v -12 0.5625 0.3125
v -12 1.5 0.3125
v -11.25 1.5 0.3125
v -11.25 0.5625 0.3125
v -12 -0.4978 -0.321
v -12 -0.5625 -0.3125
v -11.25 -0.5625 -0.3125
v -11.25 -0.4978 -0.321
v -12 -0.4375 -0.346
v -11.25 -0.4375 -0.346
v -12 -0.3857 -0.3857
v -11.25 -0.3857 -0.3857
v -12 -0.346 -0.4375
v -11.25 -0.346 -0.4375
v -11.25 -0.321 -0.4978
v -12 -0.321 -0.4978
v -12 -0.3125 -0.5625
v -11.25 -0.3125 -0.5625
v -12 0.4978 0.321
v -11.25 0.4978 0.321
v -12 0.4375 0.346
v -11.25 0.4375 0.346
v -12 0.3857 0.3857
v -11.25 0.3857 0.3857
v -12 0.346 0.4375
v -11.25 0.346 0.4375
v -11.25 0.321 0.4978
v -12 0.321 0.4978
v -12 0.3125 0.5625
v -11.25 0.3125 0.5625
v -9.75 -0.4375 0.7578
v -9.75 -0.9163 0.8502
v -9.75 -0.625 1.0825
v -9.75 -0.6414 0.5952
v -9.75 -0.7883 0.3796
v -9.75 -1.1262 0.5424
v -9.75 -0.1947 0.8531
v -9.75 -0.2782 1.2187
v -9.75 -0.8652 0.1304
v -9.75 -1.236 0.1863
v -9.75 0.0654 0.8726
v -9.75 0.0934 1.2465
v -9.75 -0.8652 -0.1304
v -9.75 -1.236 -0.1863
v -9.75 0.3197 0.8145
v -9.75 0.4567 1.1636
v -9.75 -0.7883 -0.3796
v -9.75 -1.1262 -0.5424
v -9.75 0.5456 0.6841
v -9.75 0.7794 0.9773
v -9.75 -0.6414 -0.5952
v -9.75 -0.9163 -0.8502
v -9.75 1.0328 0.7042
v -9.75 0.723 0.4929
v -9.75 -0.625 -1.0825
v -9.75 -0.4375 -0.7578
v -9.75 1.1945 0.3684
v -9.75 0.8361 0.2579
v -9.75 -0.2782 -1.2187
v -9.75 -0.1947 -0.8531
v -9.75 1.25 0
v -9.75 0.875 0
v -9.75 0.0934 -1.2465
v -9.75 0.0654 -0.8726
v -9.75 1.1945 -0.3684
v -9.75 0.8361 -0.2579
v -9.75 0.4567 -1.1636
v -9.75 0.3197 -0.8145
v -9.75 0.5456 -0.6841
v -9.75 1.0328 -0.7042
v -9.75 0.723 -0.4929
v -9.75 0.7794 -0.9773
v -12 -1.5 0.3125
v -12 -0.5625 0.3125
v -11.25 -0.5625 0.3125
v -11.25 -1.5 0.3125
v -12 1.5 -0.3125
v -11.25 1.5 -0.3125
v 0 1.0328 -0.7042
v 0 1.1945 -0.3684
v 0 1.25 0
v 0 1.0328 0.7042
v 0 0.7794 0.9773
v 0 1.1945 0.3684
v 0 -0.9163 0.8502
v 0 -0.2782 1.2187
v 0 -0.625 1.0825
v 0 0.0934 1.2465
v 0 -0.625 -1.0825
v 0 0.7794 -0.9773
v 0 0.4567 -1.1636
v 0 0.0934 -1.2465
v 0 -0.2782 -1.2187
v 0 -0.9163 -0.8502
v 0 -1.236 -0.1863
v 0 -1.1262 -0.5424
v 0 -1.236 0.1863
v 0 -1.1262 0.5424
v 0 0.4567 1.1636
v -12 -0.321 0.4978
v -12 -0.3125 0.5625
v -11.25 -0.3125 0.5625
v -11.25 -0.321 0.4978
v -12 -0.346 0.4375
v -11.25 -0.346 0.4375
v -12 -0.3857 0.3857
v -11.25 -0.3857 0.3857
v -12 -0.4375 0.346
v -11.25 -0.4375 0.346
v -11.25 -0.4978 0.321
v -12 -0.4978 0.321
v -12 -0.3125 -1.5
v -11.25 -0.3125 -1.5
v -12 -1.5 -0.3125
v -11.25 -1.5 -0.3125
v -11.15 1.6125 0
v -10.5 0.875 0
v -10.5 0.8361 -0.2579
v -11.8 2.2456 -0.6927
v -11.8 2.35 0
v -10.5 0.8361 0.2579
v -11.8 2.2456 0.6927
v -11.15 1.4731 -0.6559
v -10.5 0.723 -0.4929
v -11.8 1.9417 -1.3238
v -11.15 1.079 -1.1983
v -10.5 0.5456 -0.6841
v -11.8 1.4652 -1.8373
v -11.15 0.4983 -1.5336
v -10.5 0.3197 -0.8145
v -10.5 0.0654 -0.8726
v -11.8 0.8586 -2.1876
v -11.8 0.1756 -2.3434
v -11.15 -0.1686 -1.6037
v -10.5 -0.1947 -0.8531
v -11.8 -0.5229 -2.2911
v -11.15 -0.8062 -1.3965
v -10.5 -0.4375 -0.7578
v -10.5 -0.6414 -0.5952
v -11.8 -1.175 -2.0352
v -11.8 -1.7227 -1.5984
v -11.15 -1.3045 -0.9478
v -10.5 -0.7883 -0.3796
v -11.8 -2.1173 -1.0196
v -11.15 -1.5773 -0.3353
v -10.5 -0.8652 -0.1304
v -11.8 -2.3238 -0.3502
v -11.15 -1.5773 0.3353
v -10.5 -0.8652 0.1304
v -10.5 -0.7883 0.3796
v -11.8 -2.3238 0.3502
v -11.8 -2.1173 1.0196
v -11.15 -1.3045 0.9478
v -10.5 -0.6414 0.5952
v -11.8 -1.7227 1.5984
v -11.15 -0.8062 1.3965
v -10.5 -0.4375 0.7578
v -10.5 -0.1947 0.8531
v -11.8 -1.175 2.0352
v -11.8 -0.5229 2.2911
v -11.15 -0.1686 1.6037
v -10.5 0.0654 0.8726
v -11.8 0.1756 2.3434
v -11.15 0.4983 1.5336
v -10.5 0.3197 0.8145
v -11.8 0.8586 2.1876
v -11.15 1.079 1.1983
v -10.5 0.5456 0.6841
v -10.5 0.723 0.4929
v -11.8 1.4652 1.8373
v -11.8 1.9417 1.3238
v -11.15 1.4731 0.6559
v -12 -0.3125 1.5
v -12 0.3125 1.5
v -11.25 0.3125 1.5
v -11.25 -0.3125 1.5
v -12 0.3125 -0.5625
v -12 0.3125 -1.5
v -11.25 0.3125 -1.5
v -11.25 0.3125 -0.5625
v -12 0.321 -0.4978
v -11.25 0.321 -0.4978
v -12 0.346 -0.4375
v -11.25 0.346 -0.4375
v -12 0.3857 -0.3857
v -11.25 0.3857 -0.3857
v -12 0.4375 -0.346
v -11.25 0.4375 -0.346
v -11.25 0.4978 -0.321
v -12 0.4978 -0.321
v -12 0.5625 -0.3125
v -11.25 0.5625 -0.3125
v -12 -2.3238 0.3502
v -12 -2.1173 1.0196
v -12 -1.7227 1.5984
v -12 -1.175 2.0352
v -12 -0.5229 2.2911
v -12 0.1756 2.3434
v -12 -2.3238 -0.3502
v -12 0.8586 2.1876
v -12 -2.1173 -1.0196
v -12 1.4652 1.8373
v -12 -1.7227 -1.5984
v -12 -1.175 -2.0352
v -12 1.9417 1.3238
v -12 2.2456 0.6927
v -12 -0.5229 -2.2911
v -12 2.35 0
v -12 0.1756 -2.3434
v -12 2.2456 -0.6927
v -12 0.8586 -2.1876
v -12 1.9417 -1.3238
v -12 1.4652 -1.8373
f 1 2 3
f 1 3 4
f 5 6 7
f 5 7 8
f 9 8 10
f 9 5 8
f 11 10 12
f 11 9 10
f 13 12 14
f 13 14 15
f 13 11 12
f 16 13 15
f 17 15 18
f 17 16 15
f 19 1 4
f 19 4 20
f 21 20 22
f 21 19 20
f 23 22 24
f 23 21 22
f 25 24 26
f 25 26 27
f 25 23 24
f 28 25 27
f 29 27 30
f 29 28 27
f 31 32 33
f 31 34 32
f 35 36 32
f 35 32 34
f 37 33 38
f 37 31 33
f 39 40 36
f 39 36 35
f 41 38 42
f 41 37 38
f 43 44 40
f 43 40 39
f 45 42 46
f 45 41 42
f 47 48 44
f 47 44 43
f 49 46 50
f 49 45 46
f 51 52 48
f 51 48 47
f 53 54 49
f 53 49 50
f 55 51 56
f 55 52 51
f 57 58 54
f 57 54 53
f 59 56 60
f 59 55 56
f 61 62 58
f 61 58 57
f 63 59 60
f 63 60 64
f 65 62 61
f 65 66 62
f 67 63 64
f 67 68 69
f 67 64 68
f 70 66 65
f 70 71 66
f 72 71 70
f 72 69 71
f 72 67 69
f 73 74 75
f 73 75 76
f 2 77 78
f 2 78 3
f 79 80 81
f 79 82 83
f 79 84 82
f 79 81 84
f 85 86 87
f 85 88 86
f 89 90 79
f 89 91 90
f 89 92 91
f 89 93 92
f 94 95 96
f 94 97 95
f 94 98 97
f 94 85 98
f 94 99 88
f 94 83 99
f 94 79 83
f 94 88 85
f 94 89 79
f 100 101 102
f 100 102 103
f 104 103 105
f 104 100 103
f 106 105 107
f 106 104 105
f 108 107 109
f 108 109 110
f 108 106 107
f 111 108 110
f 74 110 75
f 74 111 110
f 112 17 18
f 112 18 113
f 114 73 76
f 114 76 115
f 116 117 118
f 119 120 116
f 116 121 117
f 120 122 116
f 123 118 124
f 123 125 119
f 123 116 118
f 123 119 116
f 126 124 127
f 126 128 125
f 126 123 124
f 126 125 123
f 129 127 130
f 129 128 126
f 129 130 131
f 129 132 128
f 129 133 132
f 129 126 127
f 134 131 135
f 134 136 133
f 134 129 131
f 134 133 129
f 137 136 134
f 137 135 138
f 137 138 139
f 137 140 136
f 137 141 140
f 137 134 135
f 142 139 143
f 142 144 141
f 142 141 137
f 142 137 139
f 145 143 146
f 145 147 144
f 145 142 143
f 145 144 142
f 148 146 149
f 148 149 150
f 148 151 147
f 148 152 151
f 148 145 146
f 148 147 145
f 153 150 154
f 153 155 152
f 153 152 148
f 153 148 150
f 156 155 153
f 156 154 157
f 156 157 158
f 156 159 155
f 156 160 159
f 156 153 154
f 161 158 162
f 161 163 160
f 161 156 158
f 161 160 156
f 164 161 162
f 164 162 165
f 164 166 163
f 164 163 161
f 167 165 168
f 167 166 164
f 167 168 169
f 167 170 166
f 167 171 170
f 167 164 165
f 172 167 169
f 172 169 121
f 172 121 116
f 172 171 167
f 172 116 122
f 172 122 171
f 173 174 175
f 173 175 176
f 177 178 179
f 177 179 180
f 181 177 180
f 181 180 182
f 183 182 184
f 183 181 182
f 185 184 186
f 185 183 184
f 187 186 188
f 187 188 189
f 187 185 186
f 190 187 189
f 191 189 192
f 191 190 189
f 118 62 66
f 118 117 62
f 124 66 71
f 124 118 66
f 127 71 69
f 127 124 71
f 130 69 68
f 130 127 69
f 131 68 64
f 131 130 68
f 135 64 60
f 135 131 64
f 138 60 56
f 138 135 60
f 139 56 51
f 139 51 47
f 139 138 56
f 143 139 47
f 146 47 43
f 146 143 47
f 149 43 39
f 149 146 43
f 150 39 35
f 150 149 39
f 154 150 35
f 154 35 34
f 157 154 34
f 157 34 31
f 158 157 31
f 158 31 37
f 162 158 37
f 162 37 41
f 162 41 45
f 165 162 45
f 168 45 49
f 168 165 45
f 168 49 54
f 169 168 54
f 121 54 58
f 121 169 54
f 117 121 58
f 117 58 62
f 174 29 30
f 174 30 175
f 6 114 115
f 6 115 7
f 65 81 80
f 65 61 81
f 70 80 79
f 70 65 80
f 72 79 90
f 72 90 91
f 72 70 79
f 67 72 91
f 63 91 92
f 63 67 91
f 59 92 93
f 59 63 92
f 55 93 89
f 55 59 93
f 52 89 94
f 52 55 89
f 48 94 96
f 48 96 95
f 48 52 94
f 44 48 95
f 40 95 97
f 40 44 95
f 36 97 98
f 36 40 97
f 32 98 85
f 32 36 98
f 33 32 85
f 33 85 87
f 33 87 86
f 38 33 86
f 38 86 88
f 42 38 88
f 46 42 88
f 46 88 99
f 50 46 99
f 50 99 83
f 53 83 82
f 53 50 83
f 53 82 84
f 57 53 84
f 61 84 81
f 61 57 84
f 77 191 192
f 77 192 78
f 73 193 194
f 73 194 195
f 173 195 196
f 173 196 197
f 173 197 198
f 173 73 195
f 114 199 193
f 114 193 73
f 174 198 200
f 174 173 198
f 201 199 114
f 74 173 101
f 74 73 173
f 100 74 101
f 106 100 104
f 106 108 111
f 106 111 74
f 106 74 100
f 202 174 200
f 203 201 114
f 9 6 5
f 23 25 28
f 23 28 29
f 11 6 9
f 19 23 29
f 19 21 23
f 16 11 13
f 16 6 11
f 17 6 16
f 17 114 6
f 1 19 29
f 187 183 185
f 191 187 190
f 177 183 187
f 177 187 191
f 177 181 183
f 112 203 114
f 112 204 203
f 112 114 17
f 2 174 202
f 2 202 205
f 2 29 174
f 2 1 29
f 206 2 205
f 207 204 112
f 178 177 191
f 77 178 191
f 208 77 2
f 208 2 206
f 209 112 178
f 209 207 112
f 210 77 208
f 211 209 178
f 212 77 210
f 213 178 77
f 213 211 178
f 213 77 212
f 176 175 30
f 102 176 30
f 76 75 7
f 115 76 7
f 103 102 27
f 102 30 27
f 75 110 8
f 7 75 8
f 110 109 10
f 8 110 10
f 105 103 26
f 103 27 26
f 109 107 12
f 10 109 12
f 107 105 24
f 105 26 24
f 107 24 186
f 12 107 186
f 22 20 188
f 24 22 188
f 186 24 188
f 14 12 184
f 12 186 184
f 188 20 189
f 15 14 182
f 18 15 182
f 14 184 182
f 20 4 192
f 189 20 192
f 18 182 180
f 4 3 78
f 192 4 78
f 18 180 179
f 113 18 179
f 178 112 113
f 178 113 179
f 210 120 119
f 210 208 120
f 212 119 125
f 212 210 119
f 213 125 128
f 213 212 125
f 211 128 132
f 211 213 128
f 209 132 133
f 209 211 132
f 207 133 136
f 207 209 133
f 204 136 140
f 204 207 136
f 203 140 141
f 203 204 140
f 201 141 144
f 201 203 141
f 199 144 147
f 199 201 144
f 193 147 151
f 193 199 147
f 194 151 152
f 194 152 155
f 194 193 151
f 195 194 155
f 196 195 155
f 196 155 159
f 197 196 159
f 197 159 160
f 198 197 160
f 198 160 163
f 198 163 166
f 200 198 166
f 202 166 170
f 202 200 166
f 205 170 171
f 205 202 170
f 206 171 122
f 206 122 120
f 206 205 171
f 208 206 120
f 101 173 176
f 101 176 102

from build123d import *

# Parameters (mm, degrees)
CUT_EXTRUDE_1_DEPTH = 0.75


with BuildPart() as part:
    # 草图1 → 旋转1 (revolve)
    with BuildSketch(Plane.XY):
        Polygon((0, 0), (0, 1.25), (-9.75, 1.25), (-9.75, 0.875), (-10.5, 0.875), (-11.8, 2.35), (-12, 2.35), (-12, 0), align=None)
    revolve(axis=Axis((0, 0, 0), (-1, 0, 0)))

    # 草图2 → 切除-拉伸1 (cut)
    with BuildSketch(Plane.ZY.offset(12)):
        with BuildLine():
            Line((-0.3125, 1.5), (0.3125, 1.5))
            Line((0.3125, 1.5), (0.3125, 0.5625))
            ThreePointArc((0.3125, 0.5625), (0.385723305, 0.385723305), (0.5625, 0.3125))
            Line((0.5625, 0.3125), (1.5, 0.3125))
            Line((1.5, 0.3125), (1.5, -0.3125))
            Line((1.5, -0.3125), (0.5625, -0.3125))
            ThreePointArc((0.5625, -0.3125), (0.385723305, -0.385723305), (0.3125, -0.5625))
            Line((0.3125, -0.5625), (0.3125, -1.5))
            Line((0.3125, -1.5), (-0.3125, -1.5))
            Line((-0.3125, -1.5), (-0.3125, -0.5625))
            ThreePointArc((-0.3125, -0.5625), (-0.385723305, -0.385723305), (-0.5625, -0.3125))
            Line((-0.5625, -0.3125), (-1.5, -0.3125))
            Line((-1.5, -0.3125), (-1.5, 0.3125))
            Line((-1.5, 0.3125), (-0.5625, 0.3125))
            ThreePointArc((-0.5625, 0.3125), (-0.385723305, 0.385723305), (-0.3125, 0.5625))
            Line((-0.3125, 0.5625), (-0.3125, 1.5))
        make_face()
    extrude(amount=-CUT_EXTRUDE_1_DEPTH, mode=Mode.SUBTRACT)


solid = part.part
